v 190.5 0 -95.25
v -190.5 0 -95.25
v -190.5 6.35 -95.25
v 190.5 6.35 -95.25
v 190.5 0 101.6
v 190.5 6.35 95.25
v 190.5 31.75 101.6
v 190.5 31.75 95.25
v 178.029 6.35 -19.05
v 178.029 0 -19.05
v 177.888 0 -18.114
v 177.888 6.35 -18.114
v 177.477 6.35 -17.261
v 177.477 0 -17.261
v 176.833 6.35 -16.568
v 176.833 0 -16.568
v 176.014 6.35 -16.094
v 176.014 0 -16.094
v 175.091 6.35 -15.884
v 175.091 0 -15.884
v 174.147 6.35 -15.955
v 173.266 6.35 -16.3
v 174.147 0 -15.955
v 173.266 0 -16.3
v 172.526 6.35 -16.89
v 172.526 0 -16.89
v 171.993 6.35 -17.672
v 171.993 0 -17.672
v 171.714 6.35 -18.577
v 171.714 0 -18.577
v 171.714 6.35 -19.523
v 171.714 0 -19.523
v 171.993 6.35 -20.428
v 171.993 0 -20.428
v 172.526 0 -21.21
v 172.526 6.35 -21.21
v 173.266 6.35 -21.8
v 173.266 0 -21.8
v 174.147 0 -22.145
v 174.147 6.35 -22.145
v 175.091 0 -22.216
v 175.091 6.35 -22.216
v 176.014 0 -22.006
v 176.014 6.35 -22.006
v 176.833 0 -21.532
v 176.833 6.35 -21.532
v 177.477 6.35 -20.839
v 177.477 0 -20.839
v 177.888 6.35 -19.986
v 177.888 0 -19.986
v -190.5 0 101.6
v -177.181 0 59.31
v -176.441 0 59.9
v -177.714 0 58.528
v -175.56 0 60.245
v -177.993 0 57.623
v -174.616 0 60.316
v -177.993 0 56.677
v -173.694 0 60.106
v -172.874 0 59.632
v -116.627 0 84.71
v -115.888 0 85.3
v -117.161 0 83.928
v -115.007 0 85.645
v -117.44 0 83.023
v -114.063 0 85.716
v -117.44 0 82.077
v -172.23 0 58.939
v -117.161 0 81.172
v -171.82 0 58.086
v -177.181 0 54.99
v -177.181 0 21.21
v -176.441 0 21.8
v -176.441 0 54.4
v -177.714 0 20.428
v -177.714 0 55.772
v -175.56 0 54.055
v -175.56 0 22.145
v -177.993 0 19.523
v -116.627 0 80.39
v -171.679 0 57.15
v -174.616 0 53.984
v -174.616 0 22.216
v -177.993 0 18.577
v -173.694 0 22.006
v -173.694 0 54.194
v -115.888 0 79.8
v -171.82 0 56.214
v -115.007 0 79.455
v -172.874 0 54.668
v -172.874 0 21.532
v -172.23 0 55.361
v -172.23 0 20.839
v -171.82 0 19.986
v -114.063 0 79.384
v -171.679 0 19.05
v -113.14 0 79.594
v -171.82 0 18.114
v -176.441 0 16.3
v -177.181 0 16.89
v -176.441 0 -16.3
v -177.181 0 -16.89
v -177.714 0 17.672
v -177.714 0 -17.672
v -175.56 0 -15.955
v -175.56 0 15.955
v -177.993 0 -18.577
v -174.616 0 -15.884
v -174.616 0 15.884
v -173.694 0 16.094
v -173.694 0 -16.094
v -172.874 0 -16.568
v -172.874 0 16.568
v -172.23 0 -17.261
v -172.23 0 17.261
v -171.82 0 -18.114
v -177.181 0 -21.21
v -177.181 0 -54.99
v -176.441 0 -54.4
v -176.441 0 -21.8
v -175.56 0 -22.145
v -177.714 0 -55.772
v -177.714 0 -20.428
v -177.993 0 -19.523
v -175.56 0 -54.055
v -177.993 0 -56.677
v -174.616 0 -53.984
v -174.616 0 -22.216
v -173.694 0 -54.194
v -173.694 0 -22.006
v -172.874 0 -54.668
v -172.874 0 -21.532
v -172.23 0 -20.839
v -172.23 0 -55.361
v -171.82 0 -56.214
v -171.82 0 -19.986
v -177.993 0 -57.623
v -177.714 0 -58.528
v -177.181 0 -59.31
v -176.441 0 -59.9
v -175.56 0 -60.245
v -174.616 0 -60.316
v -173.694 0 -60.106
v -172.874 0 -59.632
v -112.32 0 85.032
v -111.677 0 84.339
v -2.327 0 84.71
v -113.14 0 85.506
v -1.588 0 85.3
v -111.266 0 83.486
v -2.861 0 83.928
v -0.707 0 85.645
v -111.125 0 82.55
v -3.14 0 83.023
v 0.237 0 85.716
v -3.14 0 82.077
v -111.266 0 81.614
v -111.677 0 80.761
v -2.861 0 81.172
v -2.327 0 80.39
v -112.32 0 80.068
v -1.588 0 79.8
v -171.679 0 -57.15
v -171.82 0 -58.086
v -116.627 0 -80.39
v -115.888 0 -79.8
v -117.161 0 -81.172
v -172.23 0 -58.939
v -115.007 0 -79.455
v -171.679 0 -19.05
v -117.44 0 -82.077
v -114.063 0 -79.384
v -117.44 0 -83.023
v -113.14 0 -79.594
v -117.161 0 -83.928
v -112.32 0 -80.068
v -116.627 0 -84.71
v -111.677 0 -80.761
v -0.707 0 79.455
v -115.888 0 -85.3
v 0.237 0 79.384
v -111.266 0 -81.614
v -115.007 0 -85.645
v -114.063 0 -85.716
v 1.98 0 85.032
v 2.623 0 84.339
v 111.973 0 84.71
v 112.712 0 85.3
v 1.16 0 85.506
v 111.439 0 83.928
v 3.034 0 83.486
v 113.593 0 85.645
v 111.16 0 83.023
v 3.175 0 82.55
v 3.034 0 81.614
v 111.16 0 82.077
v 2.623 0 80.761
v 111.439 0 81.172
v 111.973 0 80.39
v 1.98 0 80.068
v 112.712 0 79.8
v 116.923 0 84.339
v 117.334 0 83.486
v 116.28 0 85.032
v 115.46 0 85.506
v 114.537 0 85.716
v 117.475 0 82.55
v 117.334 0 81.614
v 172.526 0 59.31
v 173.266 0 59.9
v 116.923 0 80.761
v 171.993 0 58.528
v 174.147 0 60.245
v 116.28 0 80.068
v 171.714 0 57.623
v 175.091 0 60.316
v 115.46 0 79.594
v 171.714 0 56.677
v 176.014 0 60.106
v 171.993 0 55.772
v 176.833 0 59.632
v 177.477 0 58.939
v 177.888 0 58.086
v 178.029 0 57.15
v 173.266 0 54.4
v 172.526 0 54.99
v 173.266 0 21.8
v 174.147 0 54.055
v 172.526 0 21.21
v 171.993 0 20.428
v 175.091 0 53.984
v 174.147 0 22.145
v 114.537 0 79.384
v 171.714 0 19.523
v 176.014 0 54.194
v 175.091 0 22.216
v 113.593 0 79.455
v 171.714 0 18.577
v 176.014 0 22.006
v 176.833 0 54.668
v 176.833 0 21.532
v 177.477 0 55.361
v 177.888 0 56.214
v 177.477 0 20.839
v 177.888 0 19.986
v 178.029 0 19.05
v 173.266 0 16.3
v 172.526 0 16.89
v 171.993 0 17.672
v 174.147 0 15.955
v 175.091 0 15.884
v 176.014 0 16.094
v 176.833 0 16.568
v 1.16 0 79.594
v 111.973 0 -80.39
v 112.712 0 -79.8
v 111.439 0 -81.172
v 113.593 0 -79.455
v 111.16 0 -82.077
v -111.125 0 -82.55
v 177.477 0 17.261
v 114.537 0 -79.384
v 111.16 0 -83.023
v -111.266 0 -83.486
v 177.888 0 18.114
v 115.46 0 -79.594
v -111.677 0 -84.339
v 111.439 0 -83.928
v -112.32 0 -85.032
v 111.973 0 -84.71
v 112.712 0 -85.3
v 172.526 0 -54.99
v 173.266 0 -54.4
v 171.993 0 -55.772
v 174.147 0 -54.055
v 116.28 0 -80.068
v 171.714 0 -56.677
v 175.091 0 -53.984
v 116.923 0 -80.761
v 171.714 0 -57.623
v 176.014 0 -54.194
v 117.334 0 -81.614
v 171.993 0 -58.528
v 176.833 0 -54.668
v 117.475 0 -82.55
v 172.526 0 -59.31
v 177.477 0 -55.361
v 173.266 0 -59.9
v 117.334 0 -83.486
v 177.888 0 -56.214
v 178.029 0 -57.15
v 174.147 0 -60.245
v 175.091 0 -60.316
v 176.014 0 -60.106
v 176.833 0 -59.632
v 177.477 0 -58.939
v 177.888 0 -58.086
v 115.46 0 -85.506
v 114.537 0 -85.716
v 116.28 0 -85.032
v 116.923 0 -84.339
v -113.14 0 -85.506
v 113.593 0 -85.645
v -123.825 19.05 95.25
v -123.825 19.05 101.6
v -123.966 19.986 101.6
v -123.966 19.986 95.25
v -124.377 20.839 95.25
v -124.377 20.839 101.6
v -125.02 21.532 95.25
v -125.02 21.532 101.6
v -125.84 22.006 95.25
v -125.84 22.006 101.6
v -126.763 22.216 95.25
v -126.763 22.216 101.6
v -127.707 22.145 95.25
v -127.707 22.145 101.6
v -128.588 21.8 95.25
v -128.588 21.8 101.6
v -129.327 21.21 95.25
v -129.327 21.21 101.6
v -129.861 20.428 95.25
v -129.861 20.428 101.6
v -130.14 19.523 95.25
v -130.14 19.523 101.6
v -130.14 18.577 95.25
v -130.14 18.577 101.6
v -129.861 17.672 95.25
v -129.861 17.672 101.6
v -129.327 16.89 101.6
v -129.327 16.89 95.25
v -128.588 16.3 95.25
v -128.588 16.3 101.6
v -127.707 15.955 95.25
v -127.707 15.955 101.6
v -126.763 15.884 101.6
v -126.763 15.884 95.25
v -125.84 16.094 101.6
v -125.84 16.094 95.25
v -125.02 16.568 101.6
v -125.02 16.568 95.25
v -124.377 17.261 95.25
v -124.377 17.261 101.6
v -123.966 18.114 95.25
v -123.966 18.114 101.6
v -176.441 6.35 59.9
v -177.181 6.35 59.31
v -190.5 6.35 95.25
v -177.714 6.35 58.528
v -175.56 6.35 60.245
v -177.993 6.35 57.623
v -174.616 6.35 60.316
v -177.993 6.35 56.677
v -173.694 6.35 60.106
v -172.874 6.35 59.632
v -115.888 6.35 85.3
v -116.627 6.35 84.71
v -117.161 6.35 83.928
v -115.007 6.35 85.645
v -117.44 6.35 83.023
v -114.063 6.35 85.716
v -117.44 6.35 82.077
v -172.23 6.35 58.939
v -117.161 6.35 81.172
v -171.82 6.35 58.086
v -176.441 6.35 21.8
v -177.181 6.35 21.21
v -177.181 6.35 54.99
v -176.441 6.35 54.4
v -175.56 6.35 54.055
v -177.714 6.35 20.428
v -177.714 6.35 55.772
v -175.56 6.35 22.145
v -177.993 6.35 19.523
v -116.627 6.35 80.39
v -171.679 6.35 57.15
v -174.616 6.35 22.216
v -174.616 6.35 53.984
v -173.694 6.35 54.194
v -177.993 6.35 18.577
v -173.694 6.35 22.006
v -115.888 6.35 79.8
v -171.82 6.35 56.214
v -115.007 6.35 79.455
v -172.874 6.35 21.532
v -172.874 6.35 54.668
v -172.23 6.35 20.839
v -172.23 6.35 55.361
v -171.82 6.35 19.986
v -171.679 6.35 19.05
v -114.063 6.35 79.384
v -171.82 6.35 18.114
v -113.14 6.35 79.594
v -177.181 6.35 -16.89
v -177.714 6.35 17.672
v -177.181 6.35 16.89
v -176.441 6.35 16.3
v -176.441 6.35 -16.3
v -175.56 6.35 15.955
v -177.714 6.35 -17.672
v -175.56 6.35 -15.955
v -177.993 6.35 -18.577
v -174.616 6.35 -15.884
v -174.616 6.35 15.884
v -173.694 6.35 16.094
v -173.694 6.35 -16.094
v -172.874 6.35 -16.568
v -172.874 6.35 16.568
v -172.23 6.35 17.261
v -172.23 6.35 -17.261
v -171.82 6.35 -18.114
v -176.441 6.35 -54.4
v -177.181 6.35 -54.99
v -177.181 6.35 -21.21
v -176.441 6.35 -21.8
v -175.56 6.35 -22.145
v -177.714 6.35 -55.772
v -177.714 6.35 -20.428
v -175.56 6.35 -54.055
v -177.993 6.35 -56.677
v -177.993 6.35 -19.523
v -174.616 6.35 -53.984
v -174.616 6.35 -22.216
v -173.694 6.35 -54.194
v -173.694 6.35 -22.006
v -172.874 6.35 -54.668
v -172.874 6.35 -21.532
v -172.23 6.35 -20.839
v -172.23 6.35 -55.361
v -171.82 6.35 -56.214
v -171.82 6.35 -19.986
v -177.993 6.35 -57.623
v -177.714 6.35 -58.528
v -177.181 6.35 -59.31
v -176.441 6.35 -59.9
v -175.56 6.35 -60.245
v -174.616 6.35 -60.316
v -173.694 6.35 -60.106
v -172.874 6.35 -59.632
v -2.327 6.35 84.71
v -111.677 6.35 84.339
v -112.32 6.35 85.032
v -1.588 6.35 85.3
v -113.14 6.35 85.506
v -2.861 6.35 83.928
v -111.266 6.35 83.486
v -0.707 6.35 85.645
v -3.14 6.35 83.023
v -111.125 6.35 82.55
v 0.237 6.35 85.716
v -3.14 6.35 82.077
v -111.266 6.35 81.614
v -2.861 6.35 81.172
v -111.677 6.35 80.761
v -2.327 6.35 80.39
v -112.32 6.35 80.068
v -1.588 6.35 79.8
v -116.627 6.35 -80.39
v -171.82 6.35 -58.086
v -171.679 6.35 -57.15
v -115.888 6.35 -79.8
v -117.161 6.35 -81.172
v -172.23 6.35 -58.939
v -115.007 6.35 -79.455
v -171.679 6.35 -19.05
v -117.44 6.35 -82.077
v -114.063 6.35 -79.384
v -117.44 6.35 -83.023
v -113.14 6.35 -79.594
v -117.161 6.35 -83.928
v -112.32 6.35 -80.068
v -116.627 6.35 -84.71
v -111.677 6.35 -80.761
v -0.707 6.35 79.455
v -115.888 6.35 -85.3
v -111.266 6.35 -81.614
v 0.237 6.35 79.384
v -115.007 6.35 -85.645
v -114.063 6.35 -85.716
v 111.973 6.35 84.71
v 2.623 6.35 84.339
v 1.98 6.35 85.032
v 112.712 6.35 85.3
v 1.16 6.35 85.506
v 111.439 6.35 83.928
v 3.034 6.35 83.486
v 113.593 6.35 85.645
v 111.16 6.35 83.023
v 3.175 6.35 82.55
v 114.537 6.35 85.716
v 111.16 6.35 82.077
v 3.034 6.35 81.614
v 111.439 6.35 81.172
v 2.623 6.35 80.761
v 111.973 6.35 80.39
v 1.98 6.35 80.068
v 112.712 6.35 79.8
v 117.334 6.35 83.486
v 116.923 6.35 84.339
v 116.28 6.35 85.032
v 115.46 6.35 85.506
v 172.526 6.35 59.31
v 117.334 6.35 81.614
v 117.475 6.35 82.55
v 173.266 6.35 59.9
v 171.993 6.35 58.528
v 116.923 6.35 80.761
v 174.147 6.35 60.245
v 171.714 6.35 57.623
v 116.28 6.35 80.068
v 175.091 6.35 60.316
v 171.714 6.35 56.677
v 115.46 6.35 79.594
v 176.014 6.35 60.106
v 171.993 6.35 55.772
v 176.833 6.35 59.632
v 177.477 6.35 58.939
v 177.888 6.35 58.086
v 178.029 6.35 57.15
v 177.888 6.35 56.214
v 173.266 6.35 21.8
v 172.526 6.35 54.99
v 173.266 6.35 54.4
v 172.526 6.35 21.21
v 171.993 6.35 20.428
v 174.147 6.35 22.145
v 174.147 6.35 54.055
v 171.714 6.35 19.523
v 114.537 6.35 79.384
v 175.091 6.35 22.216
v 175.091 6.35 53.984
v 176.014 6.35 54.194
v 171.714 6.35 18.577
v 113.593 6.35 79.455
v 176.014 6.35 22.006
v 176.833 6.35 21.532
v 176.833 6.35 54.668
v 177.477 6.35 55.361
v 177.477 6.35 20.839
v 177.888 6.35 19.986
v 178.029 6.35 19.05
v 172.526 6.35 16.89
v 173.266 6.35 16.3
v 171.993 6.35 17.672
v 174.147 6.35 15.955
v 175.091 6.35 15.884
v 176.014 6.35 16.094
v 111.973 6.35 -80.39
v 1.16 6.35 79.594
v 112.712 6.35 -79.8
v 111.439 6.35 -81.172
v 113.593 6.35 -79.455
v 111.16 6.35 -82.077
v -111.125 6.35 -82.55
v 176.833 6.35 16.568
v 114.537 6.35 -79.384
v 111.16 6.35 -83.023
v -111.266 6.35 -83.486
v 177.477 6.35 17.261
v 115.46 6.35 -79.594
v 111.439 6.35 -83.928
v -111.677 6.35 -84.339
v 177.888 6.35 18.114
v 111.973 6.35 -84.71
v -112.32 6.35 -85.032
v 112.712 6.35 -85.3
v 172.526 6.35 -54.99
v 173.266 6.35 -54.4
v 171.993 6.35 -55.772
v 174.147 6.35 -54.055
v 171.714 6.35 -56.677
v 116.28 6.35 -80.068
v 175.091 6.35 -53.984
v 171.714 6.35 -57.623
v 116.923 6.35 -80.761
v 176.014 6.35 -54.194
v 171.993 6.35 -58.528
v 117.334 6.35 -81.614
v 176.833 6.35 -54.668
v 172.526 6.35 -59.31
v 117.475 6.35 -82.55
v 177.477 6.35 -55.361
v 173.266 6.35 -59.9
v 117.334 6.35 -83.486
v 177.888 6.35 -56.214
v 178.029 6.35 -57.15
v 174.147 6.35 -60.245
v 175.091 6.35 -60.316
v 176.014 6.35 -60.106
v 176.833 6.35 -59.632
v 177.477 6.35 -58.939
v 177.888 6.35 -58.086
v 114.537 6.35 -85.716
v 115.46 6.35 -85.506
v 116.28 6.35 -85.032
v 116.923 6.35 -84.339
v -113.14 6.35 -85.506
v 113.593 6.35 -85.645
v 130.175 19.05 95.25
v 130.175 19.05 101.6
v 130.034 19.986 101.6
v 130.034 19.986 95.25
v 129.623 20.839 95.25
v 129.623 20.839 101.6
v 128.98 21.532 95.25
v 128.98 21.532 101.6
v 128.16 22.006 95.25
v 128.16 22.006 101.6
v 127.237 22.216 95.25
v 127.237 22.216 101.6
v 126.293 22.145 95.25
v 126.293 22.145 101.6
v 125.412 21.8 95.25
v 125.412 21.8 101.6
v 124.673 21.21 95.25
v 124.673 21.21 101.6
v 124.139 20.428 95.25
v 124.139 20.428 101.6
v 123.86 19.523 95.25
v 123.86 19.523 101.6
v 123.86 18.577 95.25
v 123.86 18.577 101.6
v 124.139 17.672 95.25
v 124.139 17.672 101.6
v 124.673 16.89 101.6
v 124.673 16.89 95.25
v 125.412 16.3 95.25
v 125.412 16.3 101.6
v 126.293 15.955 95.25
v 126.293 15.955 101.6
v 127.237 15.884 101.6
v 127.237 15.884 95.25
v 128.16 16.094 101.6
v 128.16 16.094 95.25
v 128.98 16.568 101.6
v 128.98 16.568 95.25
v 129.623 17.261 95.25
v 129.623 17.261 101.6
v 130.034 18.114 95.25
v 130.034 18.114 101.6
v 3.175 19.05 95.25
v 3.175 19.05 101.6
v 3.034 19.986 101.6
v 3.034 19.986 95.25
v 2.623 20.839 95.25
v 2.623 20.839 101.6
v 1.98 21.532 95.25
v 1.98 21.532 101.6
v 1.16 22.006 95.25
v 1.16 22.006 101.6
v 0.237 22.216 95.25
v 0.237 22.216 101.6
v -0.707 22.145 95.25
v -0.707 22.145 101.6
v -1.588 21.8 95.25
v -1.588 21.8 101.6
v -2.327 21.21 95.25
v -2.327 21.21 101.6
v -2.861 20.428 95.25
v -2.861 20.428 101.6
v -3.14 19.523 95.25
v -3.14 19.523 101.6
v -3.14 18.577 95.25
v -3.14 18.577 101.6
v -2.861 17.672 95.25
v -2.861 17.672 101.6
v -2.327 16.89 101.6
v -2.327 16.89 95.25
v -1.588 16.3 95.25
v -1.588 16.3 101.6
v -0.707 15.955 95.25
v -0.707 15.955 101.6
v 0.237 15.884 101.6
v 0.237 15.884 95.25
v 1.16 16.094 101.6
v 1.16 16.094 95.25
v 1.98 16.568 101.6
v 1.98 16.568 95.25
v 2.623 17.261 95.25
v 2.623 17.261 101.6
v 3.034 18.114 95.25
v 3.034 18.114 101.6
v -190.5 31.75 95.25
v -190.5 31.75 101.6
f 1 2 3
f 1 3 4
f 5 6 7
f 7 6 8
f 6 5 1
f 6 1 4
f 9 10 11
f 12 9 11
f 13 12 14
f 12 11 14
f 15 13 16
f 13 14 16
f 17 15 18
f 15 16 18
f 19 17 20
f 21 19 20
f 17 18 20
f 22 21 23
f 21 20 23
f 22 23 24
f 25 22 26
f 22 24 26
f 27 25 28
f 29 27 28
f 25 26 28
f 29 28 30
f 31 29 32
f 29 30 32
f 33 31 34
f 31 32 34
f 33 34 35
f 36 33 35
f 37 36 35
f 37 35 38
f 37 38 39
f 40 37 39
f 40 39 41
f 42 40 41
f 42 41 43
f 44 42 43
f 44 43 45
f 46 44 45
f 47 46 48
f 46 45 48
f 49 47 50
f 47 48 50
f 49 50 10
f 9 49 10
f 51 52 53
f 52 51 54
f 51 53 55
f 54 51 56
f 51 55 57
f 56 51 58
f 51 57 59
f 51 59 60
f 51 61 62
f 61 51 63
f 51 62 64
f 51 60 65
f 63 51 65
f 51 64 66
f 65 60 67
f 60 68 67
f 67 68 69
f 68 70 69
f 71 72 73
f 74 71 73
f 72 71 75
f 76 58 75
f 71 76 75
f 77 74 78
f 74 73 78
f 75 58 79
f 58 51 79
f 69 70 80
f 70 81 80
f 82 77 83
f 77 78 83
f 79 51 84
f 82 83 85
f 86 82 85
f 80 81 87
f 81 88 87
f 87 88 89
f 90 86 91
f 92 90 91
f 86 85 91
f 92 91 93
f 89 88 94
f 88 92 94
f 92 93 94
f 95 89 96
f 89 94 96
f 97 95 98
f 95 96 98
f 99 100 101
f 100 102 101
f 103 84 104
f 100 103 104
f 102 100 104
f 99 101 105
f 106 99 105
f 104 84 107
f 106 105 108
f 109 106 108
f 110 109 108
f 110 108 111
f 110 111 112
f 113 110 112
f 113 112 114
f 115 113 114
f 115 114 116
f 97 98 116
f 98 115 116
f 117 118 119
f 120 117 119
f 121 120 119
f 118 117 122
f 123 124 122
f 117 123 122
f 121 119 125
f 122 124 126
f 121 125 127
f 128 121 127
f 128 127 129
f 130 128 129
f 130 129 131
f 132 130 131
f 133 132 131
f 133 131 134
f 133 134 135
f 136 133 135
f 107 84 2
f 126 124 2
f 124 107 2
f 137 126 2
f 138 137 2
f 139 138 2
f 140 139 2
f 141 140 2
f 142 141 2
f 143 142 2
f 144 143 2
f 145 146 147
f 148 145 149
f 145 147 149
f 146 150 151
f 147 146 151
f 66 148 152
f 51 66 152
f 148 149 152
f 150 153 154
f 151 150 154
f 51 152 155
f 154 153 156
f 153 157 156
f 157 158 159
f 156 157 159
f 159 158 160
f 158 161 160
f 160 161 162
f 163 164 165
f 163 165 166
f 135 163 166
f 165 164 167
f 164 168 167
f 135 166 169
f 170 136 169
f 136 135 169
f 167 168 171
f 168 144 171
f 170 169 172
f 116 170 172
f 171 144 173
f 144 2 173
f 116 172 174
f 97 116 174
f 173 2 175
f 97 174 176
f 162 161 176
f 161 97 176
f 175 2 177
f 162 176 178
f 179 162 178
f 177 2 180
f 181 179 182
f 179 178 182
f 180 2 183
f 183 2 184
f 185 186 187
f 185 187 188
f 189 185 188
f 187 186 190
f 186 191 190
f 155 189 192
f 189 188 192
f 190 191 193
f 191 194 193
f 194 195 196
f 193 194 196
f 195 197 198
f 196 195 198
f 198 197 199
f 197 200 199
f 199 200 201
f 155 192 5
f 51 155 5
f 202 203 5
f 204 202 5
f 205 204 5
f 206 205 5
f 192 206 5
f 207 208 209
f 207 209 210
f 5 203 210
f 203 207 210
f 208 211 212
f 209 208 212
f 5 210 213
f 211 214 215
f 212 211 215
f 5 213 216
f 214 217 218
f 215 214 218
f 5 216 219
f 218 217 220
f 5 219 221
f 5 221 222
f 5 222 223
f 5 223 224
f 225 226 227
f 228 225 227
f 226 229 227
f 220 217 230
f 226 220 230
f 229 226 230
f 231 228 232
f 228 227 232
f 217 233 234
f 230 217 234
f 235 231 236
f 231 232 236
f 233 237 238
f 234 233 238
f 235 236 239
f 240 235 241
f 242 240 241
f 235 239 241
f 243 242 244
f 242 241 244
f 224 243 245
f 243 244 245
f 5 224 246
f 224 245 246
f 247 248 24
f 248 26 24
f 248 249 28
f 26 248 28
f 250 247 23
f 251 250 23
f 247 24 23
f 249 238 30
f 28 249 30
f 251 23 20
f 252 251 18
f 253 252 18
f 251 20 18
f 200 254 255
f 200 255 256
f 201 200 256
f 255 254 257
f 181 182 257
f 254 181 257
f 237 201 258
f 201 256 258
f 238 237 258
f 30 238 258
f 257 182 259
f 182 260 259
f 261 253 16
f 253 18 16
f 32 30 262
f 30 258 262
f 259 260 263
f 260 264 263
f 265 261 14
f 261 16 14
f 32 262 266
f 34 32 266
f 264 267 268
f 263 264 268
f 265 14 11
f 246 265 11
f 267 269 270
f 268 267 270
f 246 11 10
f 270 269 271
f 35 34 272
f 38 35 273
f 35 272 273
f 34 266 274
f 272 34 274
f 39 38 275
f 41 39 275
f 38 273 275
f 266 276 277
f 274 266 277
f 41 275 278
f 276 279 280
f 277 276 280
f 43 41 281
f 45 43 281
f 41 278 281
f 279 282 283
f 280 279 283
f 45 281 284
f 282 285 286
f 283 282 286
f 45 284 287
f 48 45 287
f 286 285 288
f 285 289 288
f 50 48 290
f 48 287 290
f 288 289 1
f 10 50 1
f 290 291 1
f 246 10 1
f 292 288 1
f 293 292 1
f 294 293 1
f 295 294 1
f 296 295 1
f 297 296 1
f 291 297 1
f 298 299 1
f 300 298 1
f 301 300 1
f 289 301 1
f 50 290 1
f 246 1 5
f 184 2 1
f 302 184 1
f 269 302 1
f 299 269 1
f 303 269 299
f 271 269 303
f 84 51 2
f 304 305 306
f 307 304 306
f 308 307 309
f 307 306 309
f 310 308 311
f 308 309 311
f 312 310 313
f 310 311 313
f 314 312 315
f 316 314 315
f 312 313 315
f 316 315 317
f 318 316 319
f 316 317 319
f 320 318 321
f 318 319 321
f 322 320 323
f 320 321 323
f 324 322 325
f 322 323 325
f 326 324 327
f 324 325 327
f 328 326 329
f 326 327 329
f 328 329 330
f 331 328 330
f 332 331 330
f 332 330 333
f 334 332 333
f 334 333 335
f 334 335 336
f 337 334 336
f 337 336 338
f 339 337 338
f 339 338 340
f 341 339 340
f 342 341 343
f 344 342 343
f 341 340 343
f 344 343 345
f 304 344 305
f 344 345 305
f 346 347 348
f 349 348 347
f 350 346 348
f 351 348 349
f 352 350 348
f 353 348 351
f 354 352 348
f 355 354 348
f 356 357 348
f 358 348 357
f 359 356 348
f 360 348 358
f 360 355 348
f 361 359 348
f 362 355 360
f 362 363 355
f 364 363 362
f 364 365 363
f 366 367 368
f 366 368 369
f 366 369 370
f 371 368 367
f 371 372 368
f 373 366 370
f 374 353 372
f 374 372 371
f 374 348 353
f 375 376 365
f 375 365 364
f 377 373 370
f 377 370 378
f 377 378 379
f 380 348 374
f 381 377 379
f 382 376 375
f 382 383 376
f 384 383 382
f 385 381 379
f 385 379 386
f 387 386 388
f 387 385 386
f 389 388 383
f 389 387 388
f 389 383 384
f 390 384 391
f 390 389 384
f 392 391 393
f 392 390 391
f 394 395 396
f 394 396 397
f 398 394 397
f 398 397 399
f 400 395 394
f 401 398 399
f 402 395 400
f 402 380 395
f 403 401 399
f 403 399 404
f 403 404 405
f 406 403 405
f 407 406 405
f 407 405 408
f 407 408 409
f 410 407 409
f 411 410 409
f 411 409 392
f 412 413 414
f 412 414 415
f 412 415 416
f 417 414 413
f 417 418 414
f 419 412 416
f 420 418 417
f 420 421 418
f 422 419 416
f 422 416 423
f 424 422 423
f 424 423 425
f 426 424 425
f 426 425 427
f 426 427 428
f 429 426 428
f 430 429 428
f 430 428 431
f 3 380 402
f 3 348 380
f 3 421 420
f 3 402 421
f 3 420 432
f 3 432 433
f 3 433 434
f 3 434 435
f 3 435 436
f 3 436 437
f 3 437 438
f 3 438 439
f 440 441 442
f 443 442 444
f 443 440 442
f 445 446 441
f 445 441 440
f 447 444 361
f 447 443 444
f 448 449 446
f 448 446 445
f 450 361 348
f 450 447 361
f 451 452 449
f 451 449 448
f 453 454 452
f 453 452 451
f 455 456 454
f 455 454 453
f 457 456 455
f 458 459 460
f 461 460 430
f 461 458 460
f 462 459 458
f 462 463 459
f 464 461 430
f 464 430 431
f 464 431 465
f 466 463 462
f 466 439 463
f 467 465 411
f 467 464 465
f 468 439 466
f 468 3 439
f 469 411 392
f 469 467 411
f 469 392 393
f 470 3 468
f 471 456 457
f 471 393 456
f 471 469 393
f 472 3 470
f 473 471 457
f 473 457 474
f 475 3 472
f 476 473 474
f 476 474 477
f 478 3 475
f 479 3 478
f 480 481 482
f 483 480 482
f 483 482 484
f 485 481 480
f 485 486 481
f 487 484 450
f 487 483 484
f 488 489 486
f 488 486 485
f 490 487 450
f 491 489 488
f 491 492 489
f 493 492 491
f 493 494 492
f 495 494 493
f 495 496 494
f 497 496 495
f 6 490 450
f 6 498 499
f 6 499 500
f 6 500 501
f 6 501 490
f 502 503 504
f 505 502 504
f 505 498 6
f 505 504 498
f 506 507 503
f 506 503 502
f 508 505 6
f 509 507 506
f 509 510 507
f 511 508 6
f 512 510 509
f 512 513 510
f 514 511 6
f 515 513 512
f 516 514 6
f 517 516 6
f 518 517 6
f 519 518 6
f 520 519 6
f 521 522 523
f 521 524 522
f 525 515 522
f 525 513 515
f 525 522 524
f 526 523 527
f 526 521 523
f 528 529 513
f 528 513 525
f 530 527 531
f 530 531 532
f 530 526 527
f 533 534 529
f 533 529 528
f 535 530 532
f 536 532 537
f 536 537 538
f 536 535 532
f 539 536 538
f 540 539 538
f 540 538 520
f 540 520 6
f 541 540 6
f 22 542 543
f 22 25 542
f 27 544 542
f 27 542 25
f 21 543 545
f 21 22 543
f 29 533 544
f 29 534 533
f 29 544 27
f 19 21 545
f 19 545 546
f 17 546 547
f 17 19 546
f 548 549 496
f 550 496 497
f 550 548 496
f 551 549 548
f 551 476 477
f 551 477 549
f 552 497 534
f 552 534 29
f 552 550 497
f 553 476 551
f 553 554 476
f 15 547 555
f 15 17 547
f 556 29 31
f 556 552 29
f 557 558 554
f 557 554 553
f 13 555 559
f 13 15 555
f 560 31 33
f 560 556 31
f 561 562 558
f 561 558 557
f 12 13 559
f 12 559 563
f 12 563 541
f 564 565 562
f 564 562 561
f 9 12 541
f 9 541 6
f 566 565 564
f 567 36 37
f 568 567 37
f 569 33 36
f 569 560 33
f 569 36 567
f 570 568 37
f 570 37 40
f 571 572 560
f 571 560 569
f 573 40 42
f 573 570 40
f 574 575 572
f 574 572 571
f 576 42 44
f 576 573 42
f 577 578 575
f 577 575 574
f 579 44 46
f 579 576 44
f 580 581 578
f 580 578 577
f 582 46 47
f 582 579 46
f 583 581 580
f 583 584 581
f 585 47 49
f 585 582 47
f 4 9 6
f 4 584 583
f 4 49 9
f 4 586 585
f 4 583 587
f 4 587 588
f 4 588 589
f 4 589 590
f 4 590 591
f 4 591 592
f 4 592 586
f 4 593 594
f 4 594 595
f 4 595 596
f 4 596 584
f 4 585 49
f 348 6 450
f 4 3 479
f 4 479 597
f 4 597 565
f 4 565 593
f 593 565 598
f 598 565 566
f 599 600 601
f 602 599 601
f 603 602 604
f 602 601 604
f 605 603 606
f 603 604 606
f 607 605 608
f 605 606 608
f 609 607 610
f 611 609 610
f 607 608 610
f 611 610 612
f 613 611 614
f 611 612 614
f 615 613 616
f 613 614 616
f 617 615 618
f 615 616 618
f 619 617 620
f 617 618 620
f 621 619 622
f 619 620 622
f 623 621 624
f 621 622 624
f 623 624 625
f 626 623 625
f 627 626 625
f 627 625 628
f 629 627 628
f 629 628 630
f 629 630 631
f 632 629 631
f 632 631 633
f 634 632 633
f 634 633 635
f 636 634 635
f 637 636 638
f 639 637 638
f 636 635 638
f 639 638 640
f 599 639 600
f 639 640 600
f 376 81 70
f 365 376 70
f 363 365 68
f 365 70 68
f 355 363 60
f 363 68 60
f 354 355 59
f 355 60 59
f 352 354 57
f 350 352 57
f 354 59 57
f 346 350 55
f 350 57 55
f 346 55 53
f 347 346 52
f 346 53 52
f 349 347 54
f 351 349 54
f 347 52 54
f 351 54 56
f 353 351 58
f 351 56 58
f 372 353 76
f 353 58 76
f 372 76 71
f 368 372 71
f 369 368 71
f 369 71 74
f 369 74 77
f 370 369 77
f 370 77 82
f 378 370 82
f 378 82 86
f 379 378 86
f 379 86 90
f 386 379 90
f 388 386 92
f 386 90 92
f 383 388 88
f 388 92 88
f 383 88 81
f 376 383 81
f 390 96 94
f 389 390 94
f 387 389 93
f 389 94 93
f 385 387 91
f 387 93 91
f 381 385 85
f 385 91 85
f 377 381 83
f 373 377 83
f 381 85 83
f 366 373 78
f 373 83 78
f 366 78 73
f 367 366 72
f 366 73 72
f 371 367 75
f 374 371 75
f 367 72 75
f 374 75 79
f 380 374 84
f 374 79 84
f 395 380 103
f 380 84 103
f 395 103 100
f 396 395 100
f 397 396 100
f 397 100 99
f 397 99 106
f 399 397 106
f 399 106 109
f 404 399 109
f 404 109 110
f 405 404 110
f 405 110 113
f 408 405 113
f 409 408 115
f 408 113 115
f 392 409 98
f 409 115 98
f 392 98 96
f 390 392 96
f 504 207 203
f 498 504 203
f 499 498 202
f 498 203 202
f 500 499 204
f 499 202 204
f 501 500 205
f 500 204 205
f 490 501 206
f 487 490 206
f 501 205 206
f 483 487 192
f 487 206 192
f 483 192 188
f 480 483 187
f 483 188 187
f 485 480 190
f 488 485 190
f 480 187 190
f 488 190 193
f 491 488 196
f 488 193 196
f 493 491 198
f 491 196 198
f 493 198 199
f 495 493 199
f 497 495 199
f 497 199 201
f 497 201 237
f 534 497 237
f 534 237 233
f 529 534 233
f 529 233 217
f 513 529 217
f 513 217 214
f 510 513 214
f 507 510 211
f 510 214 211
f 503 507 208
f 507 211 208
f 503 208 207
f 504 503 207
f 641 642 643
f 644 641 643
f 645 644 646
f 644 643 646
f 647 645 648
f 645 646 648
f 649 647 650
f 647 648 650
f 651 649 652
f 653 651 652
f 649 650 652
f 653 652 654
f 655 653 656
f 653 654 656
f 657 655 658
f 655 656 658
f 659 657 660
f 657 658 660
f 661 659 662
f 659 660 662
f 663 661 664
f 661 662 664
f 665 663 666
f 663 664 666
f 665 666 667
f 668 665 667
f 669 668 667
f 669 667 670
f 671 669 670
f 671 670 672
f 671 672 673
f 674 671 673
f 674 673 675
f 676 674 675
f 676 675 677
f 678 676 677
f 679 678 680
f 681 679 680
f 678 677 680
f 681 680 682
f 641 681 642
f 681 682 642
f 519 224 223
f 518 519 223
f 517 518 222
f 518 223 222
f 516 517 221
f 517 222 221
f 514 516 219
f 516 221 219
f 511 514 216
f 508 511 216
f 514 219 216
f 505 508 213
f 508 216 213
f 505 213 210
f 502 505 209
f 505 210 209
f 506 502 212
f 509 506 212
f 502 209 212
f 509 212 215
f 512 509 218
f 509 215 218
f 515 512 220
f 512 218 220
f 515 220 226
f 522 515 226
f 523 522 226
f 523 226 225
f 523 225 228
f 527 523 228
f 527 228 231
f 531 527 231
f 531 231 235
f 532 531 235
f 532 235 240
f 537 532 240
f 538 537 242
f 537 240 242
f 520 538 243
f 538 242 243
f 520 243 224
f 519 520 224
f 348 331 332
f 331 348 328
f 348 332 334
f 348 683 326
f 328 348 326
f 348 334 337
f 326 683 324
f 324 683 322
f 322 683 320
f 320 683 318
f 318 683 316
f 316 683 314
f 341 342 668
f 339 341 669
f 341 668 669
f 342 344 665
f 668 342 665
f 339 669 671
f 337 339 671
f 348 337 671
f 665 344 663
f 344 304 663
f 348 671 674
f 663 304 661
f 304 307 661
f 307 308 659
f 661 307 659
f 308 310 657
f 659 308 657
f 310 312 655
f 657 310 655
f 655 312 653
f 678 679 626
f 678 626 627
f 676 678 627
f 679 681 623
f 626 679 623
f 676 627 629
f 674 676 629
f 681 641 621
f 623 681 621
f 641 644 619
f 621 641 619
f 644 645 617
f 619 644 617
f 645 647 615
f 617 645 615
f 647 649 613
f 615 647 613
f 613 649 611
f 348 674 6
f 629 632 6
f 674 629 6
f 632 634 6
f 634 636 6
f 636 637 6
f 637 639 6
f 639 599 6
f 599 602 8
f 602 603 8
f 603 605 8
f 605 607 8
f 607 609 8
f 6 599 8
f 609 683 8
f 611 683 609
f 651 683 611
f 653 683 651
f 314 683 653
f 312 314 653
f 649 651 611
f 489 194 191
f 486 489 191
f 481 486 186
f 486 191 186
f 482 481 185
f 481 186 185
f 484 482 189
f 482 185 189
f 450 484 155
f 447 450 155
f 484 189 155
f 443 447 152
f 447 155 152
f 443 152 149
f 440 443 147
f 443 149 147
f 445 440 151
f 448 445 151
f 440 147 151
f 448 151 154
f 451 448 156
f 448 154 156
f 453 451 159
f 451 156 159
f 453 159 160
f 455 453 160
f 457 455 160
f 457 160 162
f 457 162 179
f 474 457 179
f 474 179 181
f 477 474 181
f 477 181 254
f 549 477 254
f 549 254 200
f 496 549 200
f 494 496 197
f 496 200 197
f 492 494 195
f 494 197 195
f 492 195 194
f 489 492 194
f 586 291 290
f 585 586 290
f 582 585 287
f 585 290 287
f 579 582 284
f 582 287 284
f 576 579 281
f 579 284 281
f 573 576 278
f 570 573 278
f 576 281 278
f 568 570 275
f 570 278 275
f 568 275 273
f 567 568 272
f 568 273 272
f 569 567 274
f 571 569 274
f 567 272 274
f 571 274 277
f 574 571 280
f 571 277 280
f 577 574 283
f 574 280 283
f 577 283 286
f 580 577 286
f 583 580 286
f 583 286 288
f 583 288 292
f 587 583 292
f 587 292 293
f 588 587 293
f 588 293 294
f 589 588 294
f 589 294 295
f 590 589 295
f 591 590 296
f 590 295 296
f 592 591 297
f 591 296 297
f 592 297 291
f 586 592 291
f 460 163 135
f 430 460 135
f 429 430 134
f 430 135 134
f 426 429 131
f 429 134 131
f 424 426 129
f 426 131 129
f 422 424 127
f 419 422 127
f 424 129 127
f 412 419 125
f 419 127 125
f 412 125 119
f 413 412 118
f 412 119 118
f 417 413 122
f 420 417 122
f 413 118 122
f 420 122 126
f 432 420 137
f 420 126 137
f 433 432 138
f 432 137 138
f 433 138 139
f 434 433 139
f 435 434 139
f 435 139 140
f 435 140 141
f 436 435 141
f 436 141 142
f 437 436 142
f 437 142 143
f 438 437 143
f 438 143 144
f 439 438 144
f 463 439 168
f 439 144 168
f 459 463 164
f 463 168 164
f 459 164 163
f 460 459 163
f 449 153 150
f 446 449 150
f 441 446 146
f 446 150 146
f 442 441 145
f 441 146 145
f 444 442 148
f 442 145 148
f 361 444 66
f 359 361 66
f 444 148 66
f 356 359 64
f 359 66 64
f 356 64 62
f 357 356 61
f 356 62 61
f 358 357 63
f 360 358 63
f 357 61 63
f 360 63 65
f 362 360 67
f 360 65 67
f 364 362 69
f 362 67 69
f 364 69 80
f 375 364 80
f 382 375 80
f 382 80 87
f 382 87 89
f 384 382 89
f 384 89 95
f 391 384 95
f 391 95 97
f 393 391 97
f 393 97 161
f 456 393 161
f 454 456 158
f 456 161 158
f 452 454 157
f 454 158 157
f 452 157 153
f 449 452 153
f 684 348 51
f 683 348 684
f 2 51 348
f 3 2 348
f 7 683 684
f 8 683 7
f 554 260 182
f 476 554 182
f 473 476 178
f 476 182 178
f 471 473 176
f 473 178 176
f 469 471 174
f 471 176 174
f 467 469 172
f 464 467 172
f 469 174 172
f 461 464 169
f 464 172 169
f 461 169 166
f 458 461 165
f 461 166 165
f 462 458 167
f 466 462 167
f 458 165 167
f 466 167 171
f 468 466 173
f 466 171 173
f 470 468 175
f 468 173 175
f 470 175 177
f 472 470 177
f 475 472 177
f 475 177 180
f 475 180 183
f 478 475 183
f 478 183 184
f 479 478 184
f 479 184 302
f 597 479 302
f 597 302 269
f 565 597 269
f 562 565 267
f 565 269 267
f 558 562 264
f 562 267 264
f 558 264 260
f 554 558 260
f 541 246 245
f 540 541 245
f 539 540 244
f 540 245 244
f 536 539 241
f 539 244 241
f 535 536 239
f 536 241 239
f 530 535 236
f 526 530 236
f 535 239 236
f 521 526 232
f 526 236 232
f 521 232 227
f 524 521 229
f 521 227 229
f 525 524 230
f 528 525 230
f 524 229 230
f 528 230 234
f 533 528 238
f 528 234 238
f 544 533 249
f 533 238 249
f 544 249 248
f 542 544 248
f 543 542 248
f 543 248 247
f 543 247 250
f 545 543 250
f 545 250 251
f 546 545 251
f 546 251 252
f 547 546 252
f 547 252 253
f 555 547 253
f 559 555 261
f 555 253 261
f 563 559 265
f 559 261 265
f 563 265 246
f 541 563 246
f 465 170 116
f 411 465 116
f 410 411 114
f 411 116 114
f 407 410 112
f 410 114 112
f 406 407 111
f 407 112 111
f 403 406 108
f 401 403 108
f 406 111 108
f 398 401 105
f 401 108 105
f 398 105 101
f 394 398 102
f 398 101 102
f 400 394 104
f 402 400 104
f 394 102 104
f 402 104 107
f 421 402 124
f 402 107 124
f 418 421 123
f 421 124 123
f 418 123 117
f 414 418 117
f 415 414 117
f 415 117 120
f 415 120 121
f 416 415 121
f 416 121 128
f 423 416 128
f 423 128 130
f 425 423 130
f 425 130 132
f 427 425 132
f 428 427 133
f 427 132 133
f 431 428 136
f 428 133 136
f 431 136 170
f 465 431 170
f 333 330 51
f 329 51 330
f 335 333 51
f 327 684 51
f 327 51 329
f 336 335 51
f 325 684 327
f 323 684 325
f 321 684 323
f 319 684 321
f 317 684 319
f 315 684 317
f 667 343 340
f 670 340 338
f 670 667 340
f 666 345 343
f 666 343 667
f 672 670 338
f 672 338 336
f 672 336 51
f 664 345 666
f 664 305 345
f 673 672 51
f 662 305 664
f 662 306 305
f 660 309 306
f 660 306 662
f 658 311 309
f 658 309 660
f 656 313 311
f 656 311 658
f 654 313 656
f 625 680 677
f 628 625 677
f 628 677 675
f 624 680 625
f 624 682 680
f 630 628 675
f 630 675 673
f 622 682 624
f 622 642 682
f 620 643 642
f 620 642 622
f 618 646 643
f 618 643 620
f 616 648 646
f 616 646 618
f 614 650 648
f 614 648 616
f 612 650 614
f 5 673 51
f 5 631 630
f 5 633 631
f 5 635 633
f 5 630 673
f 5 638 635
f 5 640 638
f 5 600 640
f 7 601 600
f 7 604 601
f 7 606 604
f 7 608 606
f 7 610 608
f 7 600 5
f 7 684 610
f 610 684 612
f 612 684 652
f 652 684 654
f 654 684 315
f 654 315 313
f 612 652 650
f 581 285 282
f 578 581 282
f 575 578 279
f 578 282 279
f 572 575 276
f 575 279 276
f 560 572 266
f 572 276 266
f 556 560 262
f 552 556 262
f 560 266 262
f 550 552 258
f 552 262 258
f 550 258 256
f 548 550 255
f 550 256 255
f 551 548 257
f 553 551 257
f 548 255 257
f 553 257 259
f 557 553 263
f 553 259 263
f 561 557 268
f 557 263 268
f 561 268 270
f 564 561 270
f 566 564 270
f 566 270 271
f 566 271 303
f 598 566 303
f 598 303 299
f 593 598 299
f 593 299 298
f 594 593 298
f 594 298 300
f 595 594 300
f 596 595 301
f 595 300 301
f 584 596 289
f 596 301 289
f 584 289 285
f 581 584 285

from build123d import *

# Parameters (mm, degrees)
SKETCH1_W           = 381
SKETCH1_H           = 190.5
BOSS_EXTRUDE1_DEPTH = 6.35
SKETCH2_W           = 381
SKETCH2_H           = 31.75
BOSS_EXTRUDE2_DEPTH = 6.35
SKETCH3_R           = 3.175
CUT_EXTRUDE1_DEPTH  = 6.35
SKETCH4_R           = 3.175
CUT_EXTRUDE2_DEPTH  = 6.35
SKETCH5_R           = 3.175
CUT_EXTRUDE3_DEPTH  = 6.35


with BuildPart() as part:
    # Sketch1 → Boss-Extrude1 (new body)
    with BuildSketch(Plane(origin=(0, 0, 0), x_dir=(1, 0, 0), z_dir=(0, 1, 0))):
        Rectangle(SKETCH1_W, SKETCH1_H)
    extrude(amount=BOSS_EXTRUDE1_DEPTH)

    # Sketch2 → Boss-Extrude2 (add)
    with BuildSketch(Plane.XY.offset(95.25)):
        with Locations((0, 15.875)):
            Rectangle(SKETCH2_W, SKETCH2_H)
    extrude(amount=BOSS_EXTRUDE2_DEPTH)

    # Sketch3 → Cut-Extrude1 (cut)
    with BuildSketch(Plane.XY.offset(101.6)):
        with Locations((0, 19.05)):
            Circle(SKETCH3_R)
        with Locations((-127, 19.05)):
            Circle(SKETCH3_R)
        with Locations((127, 19.05)):
            Circle(SKETCH3_R)
    extrude(amount=-CUT_EXTRUDE1_DEPTH, mode=Mode.SUBTRACT)

    # Sketch4 → Cut-Extrude2 (cut)
    with BuildSketch(Plane.XZ):
        with Locations((0, 82.55)):
            Circle(SKETCH4_R)
        with Locations((-114.3, 82.55)):
            Circle(SKETCH4_R)
        with Locations((114.3, 82.55)):
            Circle(SKETCH4_R)
        with Locations((-114.3, -82.55)):
            Circle(SKETCH4_R)
        with Locations((114.3, -82.55)):
            Circle(SKETCH4_R)
    extrude(amount=-CUT_EXTRUDE2_DEPTH, mode=Mode.SUBTRACT)

    # Sketch5 → Cut-Extrude3 (cut)
    with BuildSketch(Plane.XZ):
        with Locations((174.8536, 57.15)):
            Circle(SKETCH5_R)
        with Locations((174.8536, 19.05)):
            Circle(SKETCH5_R)
        with Locations((174.8536, -19.05)):
            Circle(SKETCH5_R)
        with Locations((174.8536, -57.15)):
            Circle(SKETCH5_R)
        with Locations((-174.8536, -57.15)):
            Circle(SKETCH5_R)
        with Locations((-174.8536, -19.05)):
            Circle(SKETCH5_R)
        with Locations((-174.8536, 19.05)):
            Circle(SKETCH5_R)
        with Locations((-174.8536, 57.15)):
            Circle(SKETCH5_R)
    extrude(amount=-CUT_EXTRUDE3_DEPTH, mode=Mode.SUBTRACT)


solid = part.part
